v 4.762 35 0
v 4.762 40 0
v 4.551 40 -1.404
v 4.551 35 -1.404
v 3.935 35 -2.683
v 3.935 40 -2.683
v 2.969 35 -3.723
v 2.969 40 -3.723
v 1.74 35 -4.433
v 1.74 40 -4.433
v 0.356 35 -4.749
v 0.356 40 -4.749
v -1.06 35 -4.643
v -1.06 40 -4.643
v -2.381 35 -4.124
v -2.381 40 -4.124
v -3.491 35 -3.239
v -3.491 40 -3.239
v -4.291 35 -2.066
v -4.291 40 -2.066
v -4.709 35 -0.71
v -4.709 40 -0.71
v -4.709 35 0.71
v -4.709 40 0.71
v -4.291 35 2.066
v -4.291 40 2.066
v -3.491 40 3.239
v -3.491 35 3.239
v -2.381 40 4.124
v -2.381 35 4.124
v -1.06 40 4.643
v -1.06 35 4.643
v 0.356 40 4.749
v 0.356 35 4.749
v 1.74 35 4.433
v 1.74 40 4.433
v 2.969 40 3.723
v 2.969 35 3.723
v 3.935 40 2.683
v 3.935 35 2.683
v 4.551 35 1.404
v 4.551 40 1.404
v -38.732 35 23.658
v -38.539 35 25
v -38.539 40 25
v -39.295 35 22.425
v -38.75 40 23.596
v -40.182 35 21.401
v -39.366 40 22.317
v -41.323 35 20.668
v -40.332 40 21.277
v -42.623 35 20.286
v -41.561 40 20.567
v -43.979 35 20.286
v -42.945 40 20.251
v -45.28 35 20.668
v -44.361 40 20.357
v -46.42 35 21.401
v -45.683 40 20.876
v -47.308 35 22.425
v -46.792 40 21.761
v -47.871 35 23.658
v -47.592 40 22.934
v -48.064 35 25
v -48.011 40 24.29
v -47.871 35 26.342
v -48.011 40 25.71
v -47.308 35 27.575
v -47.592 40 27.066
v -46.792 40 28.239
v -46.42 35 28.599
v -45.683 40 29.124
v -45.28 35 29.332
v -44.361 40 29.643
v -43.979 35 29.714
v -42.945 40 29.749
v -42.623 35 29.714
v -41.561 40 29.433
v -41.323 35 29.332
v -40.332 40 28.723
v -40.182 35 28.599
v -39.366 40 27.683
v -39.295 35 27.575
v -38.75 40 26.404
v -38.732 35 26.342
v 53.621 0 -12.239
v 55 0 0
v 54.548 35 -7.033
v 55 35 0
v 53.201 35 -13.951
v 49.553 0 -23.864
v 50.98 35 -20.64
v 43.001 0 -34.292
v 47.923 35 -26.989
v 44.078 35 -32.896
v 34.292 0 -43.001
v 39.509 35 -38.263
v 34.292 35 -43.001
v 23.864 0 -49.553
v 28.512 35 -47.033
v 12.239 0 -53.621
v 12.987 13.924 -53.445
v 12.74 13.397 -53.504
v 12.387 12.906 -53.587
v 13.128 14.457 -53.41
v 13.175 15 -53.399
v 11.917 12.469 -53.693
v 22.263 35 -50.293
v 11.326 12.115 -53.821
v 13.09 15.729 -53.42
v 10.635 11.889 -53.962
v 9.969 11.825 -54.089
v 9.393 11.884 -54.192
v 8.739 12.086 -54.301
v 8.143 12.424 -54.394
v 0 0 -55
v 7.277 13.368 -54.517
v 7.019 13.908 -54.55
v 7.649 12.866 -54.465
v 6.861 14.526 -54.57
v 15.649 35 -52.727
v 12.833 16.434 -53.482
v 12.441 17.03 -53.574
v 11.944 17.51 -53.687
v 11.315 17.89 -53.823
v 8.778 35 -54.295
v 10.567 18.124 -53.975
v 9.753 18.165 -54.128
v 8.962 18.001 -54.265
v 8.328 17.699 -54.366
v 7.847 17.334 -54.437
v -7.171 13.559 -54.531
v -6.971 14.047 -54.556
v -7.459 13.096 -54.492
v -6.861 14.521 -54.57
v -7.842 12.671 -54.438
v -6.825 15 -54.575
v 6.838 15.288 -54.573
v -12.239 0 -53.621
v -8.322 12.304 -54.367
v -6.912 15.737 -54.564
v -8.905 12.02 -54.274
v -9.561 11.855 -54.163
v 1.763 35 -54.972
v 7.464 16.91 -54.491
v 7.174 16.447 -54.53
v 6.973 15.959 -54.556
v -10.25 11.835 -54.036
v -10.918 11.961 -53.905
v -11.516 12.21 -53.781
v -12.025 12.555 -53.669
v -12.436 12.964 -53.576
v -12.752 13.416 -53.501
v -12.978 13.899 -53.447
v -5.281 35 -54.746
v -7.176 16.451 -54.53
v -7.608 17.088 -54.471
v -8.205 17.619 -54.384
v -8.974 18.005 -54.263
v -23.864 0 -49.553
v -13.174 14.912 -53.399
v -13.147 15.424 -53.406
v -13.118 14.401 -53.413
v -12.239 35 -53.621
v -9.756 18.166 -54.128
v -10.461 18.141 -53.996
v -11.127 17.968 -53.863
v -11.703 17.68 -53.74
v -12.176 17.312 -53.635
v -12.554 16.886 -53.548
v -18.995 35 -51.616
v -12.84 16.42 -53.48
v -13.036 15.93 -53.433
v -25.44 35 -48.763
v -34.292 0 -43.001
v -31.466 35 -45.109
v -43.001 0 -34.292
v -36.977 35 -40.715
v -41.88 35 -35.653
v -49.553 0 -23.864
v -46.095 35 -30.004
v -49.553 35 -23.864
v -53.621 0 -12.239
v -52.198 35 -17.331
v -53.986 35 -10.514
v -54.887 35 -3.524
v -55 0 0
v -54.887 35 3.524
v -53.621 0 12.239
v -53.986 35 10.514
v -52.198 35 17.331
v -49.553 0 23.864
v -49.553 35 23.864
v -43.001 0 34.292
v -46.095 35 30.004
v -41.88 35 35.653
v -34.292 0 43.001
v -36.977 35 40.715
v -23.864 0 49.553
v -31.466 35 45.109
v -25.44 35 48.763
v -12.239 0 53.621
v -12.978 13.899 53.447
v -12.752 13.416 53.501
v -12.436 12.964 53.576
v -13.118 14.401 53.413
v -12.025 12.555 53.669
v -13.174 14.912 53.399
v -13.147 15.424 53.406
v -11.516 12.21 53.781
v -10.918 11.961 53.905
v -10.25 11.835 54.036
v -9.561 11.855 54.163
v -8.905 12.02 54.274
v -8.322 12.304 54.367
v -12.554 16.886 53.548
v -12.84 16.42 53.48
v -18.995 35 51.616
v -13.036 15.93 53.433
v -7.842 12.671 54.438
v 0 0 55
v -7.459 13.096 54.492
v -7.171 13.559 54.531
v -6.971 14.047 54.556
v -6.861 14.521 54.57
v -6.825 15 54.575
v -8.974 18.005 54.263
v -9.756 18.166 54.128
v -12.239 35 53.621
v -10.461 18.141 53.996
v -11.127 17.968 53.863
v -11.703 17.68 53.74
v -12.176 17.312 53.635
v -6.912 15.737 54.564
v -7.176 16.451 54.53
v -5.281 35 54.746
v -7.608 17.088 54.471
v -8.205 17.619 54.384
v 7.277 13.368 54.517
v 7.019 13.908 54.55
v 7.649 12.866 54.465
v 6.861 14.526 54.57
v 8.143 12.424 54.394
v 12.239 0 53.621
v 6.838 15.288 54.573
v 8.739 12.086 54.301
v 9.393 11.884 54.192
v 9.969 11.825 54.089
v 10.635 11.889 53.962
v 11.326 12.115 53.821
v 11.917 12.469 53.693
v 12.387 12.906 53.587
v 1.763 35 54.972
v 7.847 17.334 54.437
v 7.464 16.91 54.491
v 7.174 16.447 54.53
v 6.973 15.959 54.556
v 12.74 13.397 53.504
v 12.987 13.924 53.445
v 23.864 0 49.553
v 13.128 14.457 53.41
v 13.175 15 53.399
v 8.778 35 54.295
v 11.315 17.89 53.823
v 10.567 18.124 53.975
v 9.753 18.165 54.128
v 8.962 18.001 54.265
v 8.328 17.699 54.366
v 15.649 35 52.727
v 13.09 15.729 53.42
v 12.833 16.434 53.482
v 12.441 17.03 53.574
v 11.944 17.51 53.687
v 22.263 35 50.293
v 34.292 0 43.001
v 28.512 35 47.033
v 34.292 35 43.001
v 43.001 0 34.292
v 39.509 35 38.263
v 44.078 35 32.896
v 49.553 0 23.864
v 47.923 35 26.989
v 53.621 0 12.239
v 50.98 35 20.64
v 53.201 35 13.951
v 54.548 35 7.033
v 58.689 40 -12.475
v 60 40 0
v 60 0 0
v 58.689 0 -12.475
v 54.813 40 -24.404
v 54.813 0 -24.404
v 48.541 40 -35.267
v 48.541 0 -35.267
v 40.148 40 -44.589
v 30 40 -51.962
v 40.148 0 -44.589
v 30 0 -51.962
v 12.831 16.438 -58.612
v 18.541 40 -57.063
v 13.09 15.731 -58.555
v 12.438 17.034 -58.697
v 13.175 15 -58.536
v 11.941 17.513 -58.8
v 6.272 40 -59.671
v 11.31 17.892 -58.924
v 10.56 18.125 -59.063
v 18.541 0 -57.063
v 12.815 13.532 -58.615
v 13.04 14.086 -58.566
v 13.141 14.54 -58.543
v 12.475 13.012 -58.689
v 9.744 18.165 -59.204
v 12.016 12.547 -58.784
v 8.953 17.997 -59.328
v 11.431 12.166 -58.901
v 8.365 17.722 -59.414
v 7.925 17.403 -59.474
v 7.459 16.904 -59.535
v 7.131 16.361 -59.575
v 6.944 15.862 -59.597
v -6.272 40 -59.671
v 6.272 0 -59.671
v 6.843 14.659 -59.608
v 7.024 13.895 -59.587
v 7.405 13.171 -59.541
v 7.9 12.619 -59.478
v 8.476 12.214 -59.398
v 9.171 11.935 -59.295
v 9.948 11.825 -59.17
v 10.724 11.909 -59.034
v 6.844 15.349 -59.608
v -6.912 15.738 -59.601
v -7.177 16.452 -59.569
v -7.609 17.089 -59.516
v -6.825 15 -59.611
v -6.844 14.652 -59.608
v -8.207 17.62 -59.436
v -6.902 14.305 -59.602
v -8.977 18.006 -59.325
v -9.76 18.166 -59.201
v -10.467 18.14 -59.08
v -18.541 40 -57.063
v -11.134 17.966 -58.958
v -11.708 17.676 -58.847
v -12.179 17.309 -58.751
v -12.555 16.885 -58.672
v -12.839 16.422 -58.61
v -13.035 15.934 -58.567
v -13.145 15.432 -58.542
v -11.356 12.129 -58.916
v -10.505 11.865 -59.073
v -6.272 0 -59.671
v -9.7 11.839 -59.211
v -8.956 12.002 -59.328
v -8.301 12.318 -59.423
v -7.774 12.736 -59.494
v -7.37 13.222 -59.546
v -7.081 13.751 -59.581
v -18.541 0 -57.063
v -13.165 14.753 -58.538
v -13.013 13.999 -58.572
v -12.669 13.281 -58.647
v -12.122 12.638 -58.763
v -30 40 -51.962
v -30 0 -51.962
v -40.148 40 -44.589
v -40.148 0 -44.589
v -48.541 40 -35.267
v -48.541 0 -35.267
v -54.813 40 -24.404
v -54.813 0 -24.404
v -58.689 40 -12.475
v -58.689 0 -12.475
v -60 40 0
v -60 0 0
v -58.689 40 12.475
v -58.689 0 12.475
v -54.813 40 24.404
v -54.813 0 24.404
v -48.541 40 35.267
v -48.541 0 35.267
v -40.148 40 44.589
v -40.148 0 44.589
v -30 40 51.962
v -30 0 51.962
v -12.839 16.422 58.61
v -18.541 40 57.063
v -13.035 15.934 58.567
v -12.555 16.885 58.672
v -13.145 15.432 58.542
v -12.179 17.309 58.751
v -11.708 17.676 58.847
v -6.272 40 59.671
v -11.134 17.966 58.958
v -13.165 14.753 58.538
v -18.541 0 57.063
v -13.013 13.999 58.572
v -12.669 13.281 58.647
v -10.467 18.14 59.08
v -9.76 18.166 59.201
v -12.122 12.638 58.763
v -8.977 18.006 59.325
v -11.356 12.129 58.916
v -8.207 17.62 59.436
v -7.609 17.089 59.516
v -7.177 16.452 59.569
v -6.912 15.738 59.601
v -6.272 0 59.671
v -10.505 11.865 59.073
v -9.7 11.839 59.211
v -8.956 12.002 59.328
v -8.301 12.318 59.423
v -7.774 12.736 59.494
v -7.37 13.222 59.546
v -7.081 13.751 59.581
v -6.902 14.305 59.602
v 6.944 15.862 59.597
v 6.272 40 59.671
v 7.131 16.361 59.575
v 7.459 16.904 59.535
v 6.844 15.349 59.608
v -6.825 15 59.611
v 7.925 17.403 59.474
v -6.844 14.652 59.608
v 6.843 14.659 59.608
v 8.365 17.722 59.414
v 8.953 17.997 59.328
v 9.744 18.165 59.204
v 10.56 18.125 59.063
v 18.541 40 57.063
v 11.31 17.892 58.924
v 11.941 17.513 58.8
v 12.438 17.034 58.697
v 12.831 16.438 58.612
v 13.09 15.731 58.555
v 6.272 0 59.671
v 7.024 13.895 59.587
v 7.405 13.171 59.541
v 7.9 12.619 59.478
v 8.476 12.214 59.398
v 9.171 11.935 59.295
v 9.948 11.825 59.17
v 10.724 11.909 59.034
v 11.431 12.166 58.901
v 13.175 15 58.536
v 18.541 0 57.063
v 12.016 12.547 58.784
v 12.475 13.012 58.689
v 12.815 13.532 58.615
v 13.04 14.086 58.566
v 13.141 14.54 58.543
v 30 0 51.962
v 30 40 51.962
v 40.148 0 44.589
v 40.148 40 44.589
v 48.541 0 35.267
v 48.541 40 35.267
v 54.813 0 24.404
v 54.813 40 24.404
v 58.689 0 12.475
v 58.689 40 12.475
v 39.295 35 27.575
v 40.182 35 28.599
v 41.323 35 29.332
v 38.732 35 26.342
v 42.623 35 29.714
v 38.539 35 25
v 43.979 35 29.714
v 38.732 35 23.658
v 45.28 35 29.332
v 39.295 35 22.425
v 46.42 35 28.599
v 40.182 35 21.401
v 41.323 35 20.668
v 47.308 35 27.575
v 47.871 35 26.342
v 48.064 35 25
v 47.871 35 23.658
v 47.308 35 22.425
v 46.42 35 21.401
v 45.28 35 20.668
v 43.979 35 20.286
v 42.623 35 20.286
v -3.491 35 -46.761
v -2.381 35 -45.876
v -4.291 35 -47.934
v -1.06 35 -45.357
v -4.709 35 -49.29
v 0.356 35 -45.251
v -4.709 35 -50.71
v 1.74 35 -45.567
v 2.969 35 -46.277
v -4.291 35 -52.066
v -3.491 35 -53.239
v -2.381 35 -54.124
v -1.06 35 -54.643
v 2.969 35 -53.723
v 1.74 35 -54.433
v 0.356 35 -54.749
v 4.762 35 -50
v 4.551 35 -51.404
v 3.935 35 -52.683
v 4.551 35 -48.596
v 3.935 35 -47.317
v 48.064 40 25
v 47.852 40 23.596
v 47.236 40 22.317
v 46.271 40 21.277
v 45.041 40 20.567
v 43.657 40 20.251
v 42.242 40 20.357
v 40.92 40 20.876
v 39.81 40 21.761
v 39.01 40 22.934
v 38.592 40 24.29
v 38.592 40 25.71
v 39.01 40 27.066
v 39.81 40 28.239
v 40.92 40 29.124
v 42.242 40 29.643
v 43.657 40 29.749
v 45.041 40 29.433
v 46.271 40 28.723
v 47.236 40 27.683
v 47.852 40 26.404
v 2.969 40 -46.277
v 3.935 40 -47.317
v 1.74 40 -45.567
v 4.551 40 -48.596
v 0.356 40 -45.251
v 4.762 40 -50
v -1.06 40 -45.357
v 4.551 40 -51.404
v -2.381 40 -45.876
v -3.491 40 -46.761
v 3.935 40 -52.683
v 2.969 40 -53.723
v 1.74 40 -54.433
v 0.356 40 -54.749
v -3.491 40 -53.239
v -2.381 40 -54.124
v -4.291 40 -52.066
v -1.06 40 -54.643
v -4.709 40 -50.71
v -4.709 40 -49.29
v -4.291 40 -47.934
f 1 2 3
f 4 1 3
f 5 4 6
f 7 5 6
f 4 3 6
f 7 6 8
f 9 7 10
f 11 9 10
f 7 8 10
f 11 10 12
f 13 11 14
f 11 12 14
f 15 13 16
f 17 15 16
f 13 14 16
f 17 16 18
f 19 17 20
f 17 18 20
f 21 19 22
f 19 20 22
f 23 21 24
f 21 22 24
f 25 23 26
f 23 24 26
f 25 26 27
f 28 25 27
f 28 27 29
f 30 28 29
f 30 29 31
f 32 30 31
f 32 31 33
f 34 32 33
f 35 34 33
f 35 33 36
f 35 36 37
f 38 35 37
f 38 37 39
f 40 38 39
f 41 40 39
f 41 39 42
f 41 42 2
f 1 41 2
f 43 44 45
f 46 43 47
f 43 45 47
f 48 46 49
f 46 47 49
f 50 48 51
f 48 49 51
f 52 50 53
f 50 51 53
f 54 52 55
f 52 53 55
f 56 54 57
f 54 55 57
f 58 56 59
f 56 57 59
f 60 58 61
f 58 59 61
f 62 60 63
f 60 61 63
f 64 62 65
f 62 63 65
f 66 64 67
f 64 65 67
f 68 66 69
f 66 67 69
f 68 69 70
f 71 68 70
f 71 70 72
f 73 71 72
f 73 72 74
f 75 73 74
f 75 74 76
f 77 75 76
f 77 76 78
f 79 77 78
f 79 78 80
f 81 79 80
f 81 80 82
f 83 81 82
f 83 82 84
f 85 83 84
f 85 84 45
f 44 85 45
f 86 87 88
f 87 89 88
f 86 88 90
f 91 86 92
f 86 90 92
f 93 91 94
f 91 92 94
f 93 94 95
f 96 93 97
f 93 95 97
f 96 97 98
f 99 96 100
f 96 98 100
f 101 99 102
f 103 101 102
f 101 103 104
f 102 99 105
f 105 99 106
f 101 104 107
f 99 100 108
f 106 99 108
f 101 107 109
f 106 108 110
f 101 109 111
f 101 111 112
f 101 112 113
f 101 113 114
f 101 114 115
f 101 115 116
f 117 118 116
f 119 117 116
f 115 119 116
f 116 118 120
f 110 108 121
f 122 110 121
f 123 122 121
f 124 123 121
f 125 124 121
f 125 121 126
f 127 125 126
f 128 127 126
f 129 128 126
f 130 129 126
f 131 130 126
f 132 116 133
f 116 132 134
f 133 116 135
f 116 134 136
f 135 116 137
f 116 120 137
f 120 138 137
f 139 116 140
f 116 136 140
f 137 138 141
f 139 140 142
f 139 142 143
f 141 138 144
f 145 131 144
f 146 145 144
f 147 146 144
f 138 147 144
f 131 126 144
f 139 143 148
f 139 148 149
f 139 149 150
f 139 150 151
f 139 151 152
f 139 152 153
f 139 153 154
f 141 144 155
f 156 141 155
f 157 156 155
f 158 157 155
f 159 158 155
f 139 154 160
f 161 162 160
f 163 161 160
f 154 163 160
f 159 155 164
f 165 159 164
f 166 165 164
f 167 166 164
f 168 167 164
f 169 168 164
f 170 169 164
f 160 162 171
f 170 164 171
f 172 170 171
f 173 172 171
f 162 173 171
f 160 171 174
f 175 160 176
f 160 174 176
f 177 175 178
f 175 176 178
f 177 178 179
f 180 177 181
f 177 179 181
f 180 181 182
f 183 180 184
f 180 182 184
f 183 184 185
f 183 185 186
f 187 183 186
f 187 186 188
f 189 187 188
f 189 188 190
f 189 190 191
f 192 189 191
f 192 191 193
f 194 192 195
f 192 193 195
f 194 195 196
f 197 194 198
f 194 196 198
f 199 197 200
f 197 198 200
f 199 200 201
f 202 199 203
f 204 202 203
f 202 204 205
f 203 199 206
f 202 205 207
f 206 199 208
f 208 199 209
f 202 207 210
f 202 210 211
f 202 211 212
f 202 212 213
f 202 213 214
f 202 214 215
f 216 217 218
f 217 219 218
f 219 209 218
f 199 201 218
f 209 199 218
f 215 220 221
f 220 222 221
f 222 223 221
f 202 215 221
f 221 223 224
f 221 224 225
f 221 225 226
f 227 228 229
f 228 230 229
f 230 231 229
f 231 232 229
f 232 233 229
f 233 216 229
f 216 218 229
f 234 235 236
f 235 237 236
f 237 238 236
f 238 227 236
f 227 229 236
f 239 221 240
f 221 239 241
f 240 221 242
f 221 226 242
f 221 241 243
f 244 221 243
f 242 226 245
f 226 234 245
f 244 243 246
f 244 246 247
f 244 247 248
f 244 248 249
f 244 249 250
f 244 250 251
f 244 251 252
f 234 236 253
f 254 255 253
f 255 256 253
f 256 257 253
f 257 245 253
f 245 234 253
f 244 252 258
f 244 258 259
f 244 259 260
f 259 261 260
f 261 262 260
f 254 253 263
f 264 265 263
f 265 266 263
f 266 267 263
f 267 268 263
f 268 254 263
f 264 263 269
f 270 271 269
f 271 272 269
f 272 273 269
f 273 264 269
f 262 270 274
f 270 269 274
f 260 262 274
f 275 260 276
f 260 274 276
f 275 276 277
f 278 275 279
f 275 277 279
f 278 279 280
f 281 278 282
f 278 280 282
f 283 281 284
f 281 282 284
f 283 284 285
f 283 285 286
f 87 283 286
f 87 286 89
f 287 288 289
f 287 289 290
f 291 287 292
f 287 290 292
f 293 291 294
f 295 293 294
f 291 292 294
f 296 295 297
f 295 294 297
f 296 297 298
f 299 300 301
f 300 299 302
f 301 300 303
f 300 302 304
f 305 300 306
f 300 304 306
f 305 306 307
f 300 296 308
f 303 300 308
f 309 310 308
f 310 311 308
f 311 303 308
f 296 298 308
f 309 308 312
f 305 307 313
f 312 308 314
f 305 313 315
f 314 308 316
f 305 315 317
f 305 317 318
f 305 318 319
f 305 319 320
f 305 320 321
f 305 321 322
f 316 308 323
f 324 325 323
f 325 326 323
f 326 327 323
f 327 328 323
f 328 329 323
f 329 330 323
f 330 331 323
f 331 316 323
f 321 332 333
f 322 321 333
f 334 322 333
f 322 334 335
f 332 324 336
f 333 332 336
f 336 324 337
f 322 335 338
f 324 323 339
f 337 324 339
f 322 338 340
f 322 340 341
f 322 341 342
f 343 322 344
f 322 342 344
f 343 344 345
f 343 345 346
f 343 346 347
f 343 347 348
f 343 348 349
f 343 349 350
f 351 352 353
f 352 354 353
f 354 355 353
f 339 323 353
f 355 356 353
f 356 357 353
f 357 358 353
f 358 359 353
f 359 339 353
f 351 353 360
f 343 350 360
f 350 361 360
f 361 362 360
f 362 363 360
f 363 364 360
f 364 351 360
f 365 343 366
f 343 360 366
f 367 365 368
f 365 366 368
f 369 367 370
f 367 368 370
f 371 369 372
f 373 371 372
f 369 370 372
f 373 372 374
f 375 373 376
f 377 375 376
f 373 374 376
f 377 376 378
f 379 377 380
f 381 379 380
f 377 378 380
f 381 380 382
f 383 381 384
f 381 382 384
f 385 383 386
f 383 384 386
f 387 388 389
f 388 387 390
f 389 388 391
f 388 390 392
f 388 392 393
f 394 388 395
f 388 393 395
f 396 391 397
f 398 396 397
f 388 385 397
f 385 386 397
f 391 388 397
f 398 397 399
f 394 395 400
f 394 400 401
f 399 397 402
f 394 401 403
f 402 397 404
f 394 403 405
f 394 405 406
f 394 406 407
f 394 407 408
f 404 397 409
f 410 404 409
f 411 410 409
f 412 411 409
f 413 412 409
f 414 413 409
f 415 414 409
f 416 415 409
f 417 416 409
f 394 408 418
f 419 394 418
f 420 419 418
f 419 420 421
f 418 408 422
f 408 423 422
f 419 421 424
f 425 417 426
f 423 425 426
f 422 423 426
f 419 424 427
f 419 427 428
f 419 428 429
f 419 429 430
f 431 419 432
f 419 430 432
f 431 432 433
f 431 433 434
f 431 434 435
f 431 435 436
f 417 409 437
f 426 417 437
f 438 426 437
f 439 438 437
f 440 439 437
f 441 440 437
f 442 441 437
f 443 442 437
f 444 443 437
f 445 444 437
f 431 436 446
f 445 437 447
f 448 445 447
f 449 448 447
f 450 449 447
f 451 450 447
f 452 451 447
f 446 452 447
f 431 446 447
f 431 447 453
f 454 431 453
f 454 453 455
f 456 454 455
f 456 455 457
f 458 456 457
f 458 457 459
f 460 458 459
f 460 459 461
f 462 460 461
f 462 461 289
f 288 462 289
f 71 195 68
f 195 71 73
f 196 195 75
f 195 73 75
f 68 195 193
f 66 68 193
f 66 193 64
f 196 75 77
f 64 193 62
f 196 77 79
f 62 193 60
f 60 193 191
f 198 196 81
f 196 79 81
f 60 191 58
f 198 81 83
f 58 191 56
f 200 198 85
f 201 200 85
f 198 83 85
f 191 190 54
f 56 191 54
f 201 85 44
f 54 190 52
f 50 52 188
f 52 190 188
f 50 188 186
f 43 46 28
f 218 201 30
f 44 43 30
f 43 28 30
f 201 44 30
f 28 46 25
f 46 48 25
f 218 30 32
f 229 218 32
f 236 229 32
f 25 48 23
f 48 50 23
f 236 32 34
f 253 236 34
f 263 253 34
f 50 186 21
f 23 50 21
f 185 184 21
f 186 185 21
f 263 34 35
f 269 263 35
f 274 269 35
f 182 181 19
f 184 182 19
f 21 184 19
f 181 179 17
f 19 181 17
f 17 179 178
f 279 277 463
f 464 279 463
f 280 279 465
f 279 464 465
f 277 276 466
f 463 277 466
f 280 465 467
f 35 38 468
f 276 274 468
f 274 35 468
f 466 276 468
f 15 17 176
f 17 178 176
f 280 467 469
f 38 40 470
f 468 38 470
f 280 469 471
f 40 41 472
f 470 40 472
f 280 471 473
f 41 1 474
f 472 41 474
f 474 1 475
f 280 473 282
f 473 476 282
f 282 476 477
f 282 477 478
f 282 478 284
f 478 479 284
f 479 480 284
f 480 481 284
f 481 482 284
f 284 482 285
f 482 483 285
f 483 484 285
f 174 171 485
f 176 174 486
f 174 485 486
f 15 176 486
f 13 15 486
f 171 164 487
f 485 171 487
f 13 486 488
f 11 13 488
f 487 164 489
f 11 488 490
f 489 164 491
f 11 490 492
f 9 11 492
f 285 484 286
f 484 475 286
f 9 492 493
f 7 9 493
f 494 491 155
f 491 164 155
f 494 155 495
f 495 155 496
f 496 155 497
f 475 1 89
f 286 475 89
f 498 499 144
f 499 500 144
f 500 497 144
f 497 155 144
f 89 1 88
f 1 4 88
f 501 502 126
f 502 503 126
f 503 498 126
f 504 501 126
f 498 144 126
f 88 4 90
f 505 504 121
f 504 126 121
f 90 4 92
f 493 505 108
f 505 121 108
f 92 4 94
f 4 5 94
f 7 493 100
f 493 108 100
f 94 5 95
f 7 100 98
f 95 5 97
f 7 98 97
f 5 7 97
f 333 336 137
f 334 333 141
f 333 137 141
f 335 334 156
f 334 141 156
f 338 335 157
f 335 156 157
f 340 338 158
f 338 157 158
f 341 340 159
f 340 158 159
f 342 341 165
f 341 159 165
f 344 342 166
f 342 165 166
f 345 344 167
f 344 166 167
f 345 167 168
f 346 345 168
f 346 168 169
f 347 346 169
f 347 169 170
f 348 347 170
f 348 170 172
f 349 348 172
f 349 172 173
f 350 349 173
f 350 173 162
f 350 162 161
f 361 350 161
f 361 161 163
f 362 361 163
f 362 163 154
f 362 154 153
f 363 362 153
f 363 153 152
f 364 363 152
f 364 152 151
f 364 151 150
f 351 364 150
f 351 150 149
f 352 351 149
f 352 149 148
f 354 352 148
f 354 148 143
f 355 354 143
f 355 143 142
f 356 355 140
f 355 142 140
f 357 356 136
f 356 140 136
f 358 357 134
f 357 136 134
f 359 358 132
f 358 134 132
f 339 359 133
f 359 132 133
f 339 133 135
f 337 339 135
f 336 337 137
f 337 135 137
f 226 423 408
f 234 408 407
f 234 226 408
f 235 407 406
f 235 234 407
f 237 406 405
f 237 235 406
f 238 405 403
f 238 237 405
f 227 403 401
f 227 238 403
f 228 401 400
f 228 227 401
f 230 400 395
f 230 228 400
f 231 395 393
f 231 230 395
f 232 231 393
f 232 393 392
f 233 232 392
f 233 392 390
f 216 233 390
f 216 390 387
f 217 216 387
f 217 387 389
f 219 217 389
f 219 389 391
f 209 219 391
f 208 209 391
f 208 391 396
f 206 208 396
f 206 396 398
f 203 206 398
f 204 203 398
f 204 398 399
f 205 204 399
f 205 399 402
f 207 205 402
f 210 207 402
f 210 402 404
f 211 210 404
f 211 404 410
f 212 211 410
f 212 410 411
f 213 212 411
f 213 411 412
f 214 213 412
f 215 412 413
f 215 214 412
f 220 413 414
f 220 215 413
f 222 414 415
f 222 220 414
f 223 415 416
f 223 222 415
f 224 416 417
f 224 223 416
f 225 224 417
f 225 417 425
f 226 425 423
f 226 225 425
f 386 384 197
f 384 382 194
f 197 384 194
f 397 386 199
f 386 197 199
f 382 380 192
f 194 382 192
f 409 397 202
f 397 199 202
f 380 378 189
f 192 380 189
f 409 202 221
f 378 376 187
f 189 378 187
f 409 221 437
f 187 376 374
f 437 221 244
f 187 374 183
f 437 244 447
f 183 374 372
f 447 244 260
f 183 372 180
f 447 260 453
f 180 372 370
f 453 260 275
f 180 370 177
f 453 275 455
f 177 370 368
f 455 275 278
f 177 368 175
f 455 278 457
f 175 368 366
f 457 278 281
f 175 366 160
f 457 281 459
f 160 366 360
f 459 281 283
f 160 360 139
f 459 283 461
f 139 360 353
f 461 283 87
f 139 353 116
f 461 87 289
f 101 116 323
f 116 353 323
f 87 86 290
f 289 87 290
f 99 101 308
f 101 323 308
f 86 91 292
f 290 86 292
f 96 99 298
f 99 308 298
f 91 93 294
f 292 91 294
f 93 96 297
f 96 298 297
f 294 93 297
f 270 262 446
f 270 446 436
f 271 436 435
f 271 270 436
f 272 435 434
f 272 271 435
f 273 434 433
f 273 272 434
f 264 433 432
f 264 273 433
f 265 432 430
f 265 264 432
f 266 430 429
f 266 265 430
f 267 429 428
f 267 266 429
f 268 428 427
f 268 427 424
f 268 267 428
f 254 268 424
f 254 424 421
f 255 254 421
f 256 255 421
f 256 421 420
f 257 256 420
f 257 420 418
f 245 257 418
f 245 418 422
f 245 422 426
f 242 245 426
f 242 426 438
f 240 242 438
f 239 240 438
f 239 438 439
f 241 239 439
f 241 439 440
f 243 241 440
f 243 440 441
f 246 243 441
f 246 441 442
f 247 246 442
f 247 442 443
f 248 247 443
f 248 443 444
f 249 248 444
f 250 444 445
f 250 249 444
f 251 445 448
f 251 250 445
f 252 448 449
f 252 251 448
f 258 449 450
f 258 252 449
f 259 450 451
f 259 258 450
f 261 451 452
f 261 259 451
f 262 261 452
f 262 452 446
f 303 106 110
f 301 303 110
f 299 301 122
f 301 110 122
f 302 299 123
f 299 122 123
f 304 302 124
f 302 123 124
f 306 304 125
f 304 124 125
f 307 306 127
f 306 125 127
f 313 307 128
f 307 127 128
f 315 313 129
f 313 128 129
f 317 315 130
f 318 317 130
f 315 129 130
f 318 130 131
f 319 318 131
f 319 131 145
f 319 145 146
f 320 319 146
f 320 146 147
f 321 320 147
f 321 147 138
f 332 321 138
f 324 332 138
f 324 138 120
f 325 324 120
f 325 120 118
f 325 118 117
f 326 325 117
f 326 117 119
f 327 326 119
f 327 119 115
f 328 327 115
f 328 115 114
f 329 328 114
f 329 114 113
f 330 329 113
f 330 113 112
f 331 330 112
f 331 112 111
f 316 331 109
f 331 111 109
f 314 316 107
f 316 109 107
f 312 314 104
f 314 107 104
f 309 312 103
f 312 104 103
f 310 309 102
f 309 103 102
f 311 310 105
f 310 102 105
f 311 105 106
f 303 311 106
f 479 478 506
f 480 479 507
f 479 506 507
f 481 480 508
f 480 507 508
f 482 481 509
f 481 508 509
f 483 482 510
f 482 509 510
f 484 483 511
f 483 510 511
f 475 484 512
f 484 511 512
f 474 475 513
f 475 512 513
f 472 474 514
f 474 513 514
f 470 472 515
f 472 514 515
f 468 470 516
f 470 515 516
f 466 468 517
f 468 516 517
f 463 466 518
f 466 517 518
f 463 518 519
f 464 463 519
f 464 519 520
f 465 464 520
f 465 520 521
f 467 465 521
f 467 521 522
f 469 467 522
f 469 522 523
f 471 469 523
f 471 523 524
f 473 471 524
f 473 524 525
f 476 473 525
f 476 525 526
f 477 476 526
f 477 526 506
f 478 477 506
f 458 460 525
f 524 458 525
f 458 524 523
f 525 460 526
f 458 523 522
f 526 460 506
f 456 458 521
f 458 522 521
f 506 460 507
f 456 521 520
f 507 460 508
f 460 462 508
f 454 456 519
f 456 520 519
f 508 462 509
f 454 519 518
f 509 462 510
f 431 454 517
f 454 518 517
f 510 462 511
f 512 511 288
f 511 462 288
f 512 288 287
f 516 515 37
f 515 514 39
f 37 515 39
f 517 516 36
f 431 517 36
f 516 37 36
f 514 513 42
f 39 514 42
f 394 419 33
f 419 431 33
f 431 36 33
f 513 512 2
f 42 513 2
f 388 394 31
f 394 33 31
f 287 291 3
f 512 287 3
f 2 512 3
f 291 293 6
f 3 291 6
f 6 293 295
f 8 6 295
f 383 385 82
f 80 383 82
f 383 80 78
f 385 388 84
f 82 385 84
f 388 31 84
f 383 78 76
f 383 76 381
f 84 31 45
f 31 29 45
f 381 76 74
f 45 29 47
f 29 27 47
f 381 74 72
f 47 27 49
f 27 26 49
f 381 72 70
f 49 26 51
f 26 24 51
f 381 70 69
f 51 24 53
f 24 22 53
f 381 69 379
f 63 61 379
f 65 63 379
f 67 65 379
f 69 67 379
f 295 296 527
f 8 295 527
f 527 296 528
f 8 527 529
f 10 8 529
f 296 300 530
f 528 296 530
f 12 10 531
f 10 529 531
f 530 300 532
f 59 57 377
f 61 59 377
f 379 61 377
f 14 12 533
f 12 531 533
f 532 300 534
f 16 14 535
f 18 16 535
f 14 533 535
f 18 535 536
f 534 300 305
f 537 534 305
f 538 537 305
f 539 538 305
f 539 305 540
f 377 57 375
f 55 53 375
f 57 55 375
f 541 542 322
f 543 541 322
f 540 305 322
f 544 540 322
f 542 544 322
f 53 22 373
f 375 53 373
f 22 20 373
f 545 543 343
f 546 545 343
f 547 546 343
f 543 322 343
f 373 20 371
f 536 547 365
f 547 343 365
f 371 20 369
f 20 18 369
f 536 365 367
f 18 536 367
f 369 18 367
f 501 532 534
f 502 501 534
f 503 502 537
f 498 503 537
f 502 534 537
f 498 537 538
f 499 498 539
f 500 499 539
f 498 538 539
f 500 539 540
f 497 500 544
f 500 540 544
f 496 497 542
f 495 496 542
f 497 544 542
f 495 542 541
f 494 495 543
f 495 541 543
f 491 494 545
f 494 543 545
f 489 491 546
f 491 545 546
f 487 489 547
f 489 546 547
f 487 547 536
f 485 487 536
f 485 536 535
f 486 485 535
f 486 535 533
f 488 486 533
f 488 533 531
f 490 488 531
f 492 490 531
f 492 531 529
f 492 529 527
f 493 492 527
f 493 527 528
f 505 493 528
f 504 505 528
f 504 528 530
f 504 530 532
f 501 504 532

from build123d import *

# Parameters (mm, degrees)
CROQUIS2_R                 = 4.7625
CORTAR_EXTRUIR1_DEPTH      = 41
CROQUIS3_R                 = 3.175
CORTAR_EXTRUIR2_DEPTH      = 61
CORTAR_EXTRUIR2_DEPTH_BACK = 61
CROQUIS4_R                 = 4.7625
CORTAR_EXTRUIR4_DEPTH      = 1.0000001
CORTAR_EXTRUIR4_DEPTH_BACK = 41.0000001


with BuildPart() as part:
    # Croquis1 → Revolución1 (revolve)
    with BuildSketch(Plane.XY):
        Polygon((0, 40), (60, 40), (60, 0), (55, 0), (55, 35), (0, 35), align=None)
    revolve(axis=Axis((0, 0, 0), (0, 1, 0)))

    # Croquis2 → Cortar-Extruir1 (cut, through all)
    with BuildSketch(Plane(origin=(0, 40, 0), x_dir=(1, 0, 0), z_dir=(0, 1, 0))):
        Circle(CROQUIS2_R)
    extrude(amount=-CORTAR_EXTRUIR1_DEPTH, mode=Mode.SUBTRACT)

    # Croquis3 → Cortar-Extruir2 (cut, two sides)
    with BuildSketch(Plane.XY) as cortar_extruir2_sk:
        with Locations((-10, 15)):
            Circle(CROQUIS3_R)
        with Locations((10, 15)):
            Circle(CROQUIS3_R)
    extrude(amount=CORTAR_EXTRUIR2_DEPTH, mode=Mode.SUBTRACT)
    extrude(cortar_extruir2_sk.sketch, amount=-CORTAR_EXTRUIR2_DEPTH_BACK, mode=Mode.SUBTRACT)

    # Croquis4 → Cortar-Extruir4 (cut, two sides)
    with BuildSketch(Plane(origin=(0, 40, 0), x_dir=(1, 0, 0), z_dir=(0, 1, 0))) as cortar_extruir4_sk:
        with Locations((0, 50)):
            Circle(CROQUIS4_R)
        with Locations((43.301270189, -25)):
            Circle(CROQUIS4_R)
        with Locations((-43.301270189, -25)):
            Circle(CROQUIS4_R)
    extrude(amount=CORTAR_EXTRUIR4_DEPTH, mode=Mode.SUBTRACT)
    extrude(cortar_extruir4_sk.sketch, amount=-CORTAR_EXTRUIR4_DEPTH_BACK, mode=Mode.SUBTRACT)


solid = part.part
